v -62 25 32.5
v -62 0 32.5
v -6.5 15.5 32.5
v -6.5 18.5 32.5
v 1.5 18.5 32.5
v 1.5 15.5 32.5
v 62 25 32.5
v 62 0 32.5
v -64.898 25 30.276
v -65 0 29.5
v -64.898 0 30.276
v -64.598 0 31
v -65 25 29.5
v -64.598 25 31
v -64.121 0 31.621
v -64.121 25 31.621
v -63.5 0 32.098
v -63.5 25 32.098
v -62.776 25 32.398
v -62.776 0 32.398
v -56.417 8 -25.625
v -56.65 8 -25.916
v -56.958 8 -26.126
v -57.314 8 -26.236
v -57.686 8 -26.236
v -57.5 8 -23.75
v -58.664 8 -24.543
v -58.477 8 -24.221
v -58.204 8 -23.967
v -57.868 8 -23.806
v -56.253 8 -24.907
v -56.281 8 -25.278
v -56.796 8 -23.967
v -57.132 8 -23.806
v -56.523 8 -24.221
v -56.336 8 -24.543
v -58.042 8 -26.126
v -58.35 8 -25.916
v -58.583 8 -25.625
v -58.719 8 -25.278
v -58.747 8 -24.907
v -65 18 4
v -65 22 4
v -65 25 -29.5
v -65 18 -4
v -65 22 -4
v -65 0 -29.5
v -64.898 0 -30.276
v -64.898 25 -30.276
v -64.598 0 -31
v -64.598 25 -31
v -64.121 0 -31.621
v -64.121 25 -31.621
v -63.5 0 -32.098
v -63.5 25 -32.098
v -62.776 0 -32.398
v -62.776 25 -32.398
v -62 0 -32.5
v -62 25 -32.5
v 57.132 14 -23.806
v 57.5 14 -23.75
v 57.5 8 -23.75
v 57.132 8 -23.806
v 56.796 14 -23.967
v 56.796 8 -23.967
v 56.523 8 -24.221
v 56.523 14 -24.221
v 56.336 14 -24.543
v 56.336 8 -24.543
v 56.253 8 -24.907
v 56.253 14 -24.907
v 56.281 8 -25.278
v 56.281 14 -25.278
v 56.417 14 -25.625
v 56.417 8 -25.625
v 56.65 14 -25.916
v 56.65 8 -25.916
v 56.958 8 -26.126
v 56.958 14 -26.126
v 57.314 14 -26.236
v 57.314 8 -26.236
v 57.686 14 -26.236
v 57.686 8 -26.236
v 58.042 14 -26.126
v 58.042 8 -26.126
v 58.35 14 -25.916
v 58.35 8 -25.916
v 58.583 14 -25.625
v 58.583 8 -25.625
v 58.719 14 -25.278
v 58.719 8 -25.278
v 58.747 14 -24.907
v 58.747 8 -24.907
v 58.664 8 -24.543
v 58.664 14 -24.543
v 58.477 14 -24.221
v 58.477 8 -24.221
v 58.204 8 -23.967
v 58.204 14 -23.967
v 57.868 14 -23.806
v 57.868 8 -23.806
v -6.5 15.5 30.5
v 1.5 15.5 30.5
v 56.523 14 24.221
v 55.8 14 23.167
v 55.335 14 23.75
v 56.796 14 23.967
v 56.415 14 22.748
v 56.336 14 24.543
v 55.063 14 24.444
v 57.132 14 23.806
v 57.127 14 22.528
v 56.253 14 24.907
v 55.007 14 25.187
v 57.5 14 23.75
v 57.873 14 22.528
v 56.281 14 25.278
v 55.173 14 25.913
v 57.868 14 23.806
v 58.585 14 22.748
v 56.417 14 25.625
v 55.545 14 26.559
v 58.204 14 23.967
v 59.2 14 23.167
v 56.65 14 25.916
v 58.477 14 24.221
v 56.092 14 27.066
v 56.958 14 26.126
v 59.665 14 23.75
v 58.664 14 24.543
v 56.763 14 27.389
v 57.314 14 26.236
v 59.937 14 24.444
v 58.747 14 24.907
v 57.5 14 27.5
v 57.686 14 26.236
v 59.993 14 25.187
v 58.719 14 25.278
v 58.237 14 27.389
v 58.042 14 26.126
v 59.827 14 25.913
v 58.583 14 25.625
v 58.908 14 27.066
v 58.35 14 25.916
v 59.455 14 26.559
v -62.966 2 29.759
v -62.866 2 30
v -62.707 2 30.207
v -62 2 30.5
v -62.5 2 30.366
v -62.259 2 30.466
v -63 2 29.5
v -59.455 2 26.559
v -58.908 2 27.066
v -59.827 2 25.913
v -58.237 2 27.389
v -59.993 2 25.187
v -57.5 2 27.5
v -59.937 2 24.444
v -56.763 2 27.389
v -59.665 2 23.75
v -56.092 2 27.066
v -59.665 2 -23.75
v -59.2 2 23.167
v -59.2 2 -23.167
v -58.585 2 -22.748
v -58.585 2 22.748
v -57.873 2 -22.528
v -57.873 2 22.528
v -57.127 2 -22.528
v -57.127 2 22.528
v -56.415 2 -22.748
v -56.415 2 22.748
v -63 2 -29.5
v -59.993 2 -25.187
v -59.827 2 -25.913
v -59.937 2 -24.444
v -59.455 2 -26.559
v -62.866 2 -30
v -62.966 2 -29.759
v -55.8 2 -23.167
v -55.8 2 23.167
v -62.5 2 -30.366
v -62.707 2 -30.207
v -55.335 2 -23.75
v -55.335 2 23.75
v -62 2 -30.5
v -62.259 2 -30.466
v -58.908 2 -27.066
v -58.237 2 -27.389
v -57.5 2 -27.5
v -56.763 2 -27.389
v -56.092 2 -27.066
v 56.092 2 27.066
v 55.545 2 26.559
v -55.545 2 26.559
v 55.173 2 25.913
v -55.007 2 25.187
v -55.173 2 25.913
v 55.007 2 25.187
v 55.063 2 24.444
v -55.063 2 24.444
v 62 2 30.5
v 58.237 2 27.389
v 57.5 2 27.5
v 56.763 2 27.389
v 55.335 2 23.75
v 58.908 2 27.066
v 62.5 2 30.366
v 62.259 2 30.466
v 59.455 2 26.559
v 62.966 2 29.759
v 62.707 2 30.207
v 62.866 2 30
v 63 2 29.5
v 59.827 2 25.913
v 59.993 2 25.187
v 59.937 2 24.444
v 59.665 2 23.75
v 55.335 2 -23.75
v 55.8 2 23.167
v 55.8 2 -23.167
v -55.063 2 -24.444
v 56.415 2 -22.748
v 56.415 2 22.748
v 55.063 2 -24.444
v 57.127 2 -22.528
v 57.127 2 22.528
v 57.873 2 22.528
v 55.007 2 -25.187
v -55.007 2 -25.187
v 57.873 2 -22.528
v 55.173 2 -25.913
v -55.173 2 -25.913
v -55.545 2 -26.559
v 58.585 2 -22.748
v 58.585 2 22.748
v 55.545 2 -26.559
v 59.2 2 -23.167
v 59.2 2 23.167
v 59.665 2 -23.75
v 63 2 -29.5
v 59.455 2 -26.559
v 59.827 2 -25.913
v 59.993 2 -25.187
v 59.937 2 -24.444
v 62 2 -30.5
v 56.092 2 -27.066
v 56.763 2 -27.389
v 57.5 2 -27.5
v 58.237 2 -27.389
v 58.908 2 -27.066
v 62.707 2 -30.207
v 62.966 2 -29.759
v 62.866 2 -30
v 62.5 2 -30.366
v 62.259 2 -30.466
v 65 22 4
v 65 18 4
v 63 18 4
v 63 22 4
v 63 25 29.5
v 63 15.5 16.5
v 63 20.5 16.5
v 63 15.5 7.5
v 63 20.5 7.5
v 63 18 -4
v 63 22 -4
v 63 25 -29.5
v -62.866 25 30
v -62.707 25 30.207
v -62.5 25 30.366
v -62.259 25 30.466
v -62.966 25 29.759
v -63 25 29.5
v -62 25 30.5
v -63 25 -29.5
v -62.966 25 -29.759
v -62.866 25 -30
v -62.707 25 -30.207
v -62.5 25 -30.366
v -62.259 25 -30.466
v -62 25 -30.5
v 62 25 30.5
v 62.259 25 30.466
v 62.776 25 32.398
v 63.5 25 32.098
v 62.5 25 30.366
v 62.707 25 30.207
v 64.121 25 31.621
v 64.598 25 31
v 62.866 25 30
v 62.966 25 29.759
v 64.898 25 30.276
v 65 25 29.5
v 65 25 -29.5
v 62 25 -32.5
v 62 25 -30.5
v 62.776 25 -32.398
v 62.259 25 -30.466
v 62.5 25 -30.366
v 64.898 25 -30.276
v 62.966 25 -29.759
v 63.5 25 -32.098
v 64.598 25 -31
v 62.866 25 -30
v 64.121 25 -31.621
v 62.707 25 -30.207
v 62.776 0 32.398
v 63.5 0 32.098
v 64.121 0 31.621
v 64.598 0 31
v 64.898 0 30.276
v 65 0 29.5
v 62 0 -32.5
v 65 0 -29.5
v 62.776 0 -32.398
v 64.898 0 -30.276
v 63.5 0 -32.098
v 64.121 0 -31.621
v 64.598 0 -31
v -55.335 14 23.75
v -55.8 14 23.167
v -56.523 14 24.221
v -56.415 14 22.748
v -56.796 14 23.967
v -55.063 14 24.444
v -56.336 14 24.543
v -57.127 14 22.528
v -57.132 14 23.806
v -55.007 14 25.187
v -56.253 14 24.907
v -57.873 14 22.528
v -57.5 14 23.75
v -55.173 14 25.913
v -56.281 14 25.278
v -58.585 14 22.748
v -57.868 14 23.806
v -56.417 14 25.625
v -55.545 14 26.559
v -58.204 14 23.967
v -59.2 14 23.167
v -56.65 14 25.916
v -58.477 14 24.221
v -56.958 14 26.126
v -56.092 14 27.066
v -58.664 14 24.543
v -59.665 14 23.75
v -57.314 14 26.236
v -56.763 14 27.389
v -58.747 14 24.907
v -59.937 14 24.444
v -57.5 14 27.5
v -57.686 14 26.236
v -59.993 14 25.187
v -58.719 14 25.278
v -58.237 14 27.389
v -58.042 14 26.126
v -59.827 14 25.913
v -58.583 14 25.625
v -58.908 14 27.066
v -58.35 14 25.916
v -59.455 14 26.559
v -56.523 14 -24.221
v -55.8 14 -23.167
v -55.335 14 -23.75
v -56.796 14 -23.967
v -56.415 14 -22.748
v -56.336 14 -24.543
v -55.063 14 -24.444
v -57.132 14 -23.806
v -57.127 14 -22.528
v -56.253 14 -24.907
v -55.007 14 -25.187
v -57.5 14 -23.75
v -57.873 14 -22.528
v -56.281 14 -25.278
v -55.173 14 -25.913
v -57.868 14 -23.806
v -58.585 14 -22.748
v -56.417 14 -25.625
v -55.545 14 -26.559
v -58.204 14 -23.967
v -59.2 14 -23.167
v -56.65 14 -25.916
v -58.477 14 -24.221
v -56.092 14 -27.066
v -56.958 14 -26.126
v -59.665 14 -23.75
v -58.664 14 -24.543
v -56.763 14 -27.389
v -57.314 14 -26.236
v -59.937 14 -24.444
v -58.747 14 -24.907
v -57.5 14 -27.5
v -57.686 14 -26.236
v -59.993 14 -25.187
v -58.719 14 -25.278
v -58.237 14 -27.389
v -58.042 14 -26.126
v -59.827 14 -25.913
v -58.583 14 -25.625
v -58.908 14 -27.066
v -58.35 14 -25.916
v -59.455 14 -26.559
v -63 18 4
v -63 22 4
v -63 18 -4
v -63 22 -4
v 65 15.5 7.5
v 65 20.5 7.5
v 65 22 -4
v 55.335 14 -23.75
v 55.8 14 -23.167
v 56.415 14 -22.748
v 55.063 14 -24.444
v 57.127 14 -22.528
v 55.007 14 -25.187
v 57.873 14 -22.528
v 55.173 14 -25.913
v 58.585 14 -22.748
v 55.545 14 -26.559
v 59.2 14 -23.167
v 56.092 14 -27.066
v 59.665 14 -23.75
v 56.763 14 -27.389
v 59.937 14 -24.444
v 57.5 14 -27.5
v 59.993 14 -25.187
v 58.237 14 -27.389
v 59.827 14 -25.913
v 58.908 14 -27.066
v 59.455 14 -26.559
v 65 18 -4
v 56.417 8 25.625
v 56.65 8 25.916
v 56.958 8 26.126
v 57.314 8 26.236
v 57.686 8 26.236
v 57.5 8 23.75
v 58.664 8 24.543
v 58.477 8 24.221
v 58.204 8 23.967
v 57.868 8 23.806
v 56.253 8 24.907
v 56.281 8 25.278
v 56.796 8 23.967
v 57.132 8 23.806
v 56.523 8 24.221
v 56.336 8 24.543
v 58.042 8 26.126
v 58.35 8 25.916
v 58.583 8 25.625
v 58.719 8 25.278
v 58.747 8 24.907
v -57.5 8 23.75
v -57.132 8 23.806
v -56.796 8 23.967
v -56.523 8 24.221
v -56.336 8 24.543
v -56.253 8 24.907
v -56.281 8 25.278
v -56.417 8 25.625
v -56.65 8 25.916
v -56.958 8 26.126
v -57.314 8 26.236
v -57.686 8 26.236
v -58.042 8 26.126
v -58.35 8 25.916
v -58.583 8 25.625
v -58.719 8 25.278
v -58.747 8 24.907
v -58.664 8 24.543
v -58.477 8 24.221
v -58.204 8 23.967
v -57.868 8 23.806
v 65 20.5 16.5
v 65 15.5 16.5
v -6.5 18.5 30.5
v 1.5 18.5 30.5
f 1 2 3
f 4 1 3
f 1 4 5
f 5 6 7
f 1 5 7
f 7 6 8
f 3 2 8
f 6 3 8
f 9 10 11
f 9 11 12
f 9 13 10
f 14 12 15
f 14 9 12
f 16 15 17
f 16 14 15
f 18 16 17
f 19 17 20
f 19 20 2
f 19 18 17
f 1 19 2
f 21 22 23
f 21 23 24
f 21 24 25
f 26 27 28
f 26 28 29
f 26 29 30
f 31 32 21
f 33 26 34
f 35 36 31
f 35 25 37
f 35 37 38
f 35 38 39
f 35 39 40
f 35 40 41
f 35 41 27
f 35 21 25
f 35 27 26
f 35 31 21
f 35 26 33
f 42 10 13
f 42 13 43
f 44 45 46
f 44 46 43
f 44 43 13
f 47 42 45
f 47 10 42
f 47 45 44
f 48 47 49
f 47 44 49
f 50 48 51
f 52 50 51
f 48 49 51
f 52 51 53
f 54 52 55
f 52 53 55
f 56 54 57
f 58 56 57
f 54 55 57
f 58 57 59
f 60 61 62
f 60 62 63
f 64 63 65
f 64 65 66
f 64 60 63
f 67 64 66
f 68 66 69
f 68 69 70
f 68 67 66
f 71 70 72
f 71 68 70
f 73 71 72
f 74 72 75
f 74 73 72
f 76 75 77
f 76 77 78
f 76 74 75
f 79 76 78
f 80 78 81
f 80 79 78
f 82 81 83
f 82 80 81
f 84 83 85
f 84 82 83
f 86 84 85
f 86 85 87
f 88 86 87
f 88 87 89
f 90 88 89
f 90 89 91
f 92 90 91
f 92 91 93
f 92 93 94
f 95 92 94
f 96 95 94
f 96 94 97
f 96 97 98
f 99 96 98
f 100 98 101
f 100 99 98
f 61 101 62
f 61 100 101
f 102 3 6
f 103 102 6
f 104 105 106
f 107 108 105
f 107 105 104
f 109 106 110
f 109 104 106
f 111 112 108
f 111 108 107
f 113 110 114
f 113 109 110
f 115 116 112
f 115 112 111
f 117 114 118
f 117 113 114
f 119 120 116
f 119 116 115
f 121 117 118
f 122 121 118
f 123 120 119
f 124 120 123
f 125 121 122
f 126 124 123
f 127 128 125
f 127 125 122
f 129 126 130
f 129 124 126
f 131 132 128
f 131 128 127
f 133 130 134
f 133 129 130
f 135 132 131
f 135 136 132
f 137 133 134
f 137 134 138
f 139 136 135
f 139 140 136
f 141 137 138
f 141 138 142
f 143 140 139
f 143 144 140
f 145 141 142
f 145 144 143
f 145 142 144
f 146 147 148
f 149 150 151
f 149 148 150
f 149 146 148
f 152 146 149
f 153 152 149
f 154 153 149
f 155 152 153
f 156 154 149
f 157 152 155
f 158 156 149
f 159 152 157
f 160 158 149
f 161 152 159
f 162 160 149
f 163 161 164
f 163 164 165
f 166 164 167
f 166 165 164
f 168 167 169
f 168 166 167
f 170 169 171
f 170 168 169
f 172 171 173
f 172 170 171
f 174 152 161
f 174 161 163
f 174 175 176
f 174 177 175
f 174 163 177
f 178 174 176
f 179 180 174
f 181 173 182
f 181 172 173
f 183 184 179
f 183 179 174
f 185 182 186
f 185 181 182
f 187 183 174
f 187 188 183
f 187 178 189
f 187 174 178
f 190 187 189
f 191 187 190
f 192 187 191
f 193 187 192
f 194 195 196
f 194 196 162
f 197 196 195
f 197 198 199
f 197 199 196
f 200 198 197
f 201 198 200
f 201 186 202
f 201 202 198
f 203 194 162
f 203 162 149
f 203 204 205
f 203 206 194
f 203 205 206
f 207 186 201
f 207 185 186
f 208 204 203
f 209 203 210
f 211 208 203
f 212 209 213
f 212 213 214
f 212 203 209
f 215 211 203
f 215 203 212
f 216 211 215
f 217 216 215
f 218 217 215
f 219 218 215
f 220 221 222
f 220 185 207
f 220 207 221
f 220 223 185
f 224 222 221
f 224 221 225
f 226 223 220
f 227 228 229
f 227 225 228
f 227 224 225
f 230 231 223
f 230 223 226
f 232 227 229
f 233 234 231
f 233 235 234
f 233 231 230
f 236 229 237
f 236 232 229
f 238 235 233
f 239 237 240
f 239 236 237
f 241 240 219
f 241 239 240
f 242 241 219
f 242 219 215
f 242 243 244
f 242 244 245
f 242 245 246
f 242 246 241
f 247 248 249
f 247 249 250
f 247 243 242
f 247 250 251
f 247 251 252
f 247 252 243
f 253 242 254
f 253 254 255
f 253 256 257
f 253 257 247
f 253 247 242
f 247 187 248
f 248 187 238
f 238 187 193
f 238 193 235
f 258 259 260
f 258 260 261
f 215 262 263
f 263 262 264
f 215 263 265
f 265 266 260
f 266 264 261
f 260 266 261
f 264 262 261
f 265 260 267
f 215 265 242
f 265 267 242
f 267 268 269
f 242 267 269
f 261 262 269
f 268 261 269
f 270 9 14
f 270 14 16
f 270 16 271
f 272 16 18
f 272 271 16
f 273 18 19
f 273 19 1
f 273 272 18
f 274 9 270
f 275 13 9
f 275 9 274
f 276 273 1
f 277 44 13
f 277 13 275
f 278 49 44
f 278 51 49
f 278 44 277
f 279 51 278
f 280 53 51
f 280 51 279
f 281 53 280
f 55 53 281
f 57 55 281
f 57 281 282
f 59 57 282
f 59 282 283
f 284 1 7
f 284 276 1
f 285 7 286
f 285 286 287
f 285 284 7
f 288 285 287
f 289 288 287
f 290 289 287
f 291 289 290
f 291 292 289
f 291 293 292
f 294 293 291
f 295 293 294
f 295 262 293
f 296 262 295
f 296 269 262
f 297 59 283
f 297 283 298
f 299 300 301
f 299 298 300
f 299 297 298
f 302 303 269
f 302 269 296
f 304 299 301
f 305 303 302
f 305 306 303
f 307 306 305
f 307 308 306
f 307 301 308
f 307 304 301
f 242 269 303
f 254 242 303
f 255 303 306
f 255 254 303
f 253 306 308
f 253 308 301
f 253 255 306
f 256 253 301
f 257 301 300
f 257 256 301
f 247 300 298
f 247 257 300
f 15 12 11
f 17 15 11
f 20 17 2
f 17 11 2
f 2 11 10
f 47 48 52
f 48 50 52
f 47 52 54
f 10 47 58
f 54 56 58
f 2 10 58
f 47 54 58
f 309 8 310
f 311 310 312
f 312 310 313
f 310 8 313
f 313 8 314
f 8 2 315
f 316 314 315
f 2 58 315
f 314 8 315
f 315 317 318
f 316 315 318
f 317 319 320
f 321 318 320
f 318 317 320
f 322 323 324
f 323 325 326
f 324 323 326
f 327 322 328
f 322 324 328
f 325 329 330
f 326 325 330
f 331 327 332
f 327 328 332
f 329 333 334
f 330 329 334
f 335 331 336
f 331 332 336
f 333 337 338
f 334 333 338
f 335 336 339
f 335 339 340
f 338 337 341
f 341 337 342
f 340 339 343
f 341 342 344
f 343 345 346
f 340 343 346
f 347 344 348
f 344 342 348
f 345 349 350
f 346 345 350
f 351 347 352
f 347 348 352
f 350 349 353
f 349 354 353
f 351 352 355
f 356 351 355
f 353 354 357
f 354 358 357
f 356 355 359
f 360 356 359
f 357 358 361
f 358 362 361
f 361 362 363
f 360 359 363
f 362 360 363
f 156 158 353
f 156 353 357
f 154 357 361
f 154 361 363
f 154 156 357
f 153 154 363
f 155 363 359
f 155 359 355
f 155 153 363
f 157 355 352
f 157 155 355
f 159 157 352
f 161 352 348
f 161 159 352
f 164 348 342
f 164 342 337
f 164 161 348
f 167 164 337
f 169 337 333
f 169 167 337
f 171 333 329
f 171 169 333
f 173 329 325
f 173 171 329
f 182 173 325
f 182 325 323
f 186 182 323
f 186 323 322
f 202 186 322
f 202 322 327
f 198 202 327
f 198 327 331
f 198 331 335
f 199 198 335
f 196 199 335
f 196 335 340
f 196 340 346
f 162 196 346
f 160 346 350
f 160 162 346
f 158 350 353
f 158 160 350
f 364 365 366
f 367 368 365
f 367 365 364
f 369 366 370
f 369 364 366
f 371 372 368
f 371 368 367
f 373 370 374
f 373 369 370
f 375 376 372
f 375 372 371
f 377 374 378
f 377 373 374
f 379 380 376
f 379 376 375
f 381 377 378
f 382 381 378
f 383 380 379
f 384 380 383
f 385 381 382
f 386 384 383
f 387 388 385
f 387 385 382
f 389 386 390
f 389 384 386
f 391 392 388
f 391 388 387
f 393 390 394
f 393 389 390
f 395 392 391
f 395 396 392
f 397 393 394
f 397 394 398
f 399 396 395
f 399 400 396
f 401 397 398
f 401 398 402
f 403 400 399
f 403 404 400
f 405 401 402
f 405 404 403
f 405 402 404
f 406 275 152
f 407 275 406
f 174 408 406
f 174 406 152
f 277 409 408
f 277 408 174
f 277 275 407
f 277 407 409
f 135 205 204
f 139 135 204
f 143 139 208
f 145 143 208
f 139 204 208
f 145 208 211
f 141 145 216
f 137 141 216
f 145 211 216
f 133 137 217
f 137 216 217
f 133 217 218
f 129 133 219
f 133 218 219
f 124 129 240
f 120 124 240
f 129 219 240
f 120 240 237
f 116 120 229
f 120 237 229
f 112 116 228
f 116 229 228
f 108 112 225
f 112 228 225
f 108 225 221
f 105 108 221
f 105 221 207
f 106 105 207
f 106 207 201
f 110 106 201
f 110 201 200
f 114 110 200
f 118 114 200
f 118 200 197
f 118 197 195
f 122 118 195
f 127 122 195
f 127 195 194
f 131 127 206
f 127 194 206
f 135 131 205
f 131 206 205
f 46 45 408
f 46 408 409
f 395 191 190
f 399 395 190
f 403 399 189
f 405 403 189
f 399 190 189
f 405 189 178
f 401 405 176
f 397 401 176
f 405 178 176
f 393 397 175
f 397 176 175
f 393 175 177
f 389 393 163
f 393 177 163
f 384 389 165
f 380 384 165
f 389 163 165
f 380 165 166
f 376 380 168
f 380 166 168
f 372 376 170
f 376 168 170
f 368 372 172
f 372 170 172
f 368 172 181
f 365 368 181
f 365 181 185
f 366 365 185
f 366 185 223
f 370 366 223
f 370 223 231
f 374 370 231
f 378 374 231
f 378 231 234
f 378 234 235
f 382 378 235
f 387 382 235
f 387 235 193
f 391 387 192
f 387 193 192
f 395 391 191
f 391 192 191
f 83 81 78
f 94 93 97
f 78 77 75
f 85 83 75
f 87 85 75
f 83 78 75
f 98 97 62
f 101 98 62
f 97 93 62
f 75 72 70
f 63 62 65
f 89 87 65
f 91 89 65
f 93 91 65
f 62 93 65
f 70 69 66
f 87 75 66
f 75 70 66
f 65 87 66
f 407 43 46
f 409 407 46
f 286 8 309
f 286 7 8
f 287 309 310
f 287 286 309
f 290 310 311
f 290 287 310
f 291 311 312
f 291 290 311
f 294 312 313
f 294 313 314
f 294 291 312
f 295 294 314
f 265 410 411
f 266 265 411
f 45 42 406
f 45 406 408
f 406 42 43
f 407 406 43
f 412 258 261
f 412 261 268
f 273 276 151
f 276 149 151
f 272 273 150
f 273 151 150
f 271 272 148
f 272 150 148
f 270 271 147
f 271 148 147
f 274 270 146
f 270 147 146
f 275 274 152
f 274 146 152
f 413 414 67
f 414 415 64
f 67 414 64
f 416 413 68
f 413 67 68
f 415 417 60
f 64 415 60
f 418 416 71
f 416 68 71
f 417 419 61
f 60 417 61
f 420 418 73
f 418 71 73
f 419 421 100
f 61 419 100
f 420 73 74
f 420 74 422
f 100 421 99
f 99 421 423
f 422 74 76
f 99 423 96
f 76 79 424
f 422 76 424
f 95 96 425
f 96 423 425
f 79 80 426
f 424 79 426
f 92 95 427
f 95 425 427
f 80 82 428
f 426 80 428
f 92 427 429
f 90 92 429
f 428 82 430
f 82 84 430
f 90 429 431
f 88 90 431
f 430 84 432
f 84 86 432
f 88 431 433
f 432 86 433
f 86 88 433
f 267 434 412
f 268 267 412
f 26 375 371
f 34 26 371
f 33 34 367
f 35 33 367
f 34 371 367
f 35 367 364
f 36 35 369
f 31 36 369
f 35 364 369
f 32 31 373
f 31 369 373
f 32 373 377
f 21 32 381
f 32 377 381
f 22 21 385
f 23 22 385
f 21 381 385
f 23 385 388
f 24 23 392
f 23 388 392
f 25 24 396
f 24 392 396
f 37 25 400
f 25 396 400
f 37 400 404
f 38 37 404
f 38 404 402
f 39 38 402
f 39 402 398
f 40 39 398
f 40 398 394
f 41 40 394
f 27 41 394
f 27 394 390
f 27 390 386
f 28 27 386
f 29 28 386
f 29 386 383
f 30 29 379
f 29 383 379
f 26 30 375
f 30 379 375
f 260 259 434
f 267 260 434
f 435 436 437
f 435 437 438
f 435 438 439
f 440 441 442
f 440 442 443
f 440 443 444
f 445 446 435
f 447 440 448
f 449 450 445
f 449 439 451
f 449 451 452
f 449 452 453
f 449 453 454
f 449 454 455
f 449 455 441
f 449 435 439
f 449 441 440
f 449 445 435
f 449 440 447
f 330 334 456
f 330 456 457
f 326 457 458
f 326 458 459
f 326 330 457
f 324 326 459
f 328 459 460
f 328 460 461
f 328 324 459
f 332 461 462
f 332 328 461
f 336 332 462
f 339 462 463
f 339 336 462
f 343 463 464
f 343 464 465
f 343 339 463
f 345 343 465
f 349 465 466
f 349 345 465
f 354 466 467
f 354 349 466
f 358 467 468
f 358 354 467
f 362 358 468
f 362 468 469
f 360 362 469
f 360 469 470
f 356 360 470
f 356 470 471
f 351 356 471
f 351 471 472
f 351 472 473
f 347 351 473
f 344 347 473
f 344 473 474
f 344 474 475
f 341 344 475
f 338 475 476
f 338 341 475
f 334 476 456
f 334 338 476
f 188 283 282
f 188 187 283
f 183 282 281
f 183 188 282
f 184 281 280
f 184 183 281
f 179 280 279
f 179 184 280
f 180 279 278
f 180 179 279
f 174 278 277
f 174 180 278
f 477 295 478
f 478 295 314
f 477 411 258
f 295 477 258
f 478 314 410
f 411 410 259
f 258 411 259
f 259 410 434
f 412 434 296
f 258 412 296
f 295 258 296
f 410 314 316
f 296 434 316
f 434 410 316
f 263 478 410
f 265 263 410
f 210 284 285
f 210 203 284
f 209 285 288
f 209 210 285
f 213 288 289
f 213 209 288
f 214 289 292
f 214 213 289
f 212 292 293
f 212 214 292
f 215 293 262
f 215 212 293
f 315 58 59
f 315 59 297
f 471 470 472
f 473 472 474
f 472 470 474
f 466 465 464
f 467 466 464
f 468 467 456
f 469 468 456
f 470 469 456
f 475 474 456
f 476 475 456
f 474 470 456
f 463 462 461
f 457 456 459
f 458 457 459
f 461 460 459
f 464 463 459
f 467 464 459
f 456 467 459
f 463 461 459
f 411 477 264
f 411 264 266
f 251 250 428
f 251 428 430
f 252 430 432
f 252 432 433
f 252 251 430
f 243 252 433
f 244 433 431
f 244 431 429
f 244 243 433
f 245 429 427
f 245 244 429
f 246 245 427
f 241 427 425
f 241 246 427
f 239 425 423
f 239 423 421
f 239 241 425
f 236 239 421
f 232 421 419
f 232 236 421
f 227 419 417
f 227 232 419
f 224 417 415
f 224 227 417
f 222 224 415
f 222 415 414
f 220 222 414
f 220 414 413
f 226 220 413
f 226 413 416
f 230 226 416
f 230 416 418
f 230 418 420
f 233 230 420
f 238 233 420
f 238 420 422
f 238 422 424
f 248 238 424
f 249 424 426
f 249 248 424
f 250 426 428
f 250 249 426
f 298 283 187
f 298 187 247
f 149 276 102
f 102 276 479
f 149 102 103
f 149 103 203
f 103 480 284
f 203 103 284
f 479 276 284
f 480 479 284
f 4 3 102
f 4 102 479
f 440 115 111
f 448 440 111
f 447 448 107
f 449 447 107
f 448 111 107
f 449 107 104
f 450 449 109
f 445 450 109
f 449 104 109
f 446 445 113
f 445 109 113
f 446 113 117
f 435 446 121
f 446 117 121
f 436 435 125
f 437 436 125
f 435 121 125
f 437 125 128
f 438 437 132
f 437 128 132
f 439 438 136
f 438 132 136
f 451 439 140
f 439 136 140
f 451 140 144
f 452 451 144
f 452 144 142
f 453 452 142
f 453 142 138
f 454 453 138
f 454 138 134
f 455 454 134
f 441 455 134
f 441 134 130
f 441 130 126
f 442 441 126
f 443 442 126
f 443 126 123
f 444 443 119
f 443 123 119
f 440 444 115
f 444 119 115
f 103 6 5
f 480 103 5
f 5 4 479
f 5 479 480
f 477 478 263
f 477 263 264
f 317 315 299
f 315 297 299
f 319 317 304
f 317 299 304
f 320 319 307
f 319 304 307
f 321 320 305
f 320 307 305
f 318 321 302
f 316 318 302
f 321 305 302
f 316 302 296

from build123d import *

# Parameters (mm, degrees)
SKETCH_1_W               = 130
SKETCH_1_H               = 65
EXTRUDE_1_DEPTH          = 25
SKETCH_2_W               = 126
SKETCH_2_H               = 61
CUT_EXTRUDE_1_DEPTH      = 23
SKETCH_3_R               = 2.5
EXTRUDE_2_DEPTH          = 12
SKETCH_5_W               = 8
SKETCH_5_H               = 4
CUT_EXTRUDE_3_DEPTH      = 2
SKETCH_6_W               = 8
SKETCH_6_H               = 3
CUT_EXTRUDE_4_DEPTH      = 2
SKETCH_7_W               = 9
SKETCH_7_H               = 5
CUT_EXTRUDE_5_DEPTH      = 2
SKETCH_8_R               = 1.25
CUT_EXTRUDE_6_DEPTH      = 6
MIRROR_7_COPY_1_SKETCH_R = 2.5
MIRROR_7_COPY_1_DEPTH    = 12
MIRROR_7_COPY_2_SKETCH_R = 1.25
MIRROR_7_COPY_2_DEPTH    = 6
FILLET_1_R               = 1
FILLET_2_R               = 3


with BuildPart() as part:
    # Эскиз1 → Бобышка-Вытянуть1 (new body)
    with BuildSketch(Plane(origin=(0, 0, 0), x_dir=(1, 0, 0), z_dir=(0, 1, 0))):
        Rectangle(SKETCH_1_W, SKETCH_1_H)
    extrude(amount=EXTRUDE_1_DEPTH)

    # Эскиз2 → Вырез-Вытянуть1 (cut)
    with BuildSketch(Plane(origin=(0, 25, 0), x_dir=(1, 0, 0), z_dir=(0, 1, 0))):
        Rectangle(SKETCH_2_W, SKETCH_2_H)
    extrude(amount=-CUT_EXTRUDE_1_DEPTH, mode=Mode.SUBTRACT)

    # Эскиз3 → Бобышка-Вытянуть2 (add)
    with BuildSketch(Plane(origin=(0, 2, 0), x_dir=(1, 0, 0), z_dir=(0, 1, 0))):
        with Locations(Location((-57.5, 25, 0), (0, 0, 90))):
            Circle(SKETCH_3_R)
    extrude_2 = extrude(amount=EXTRUDE_2_DEPTH)

    # Эскиз5 → Вырез-Вытянуть3 (cut)
    with BuildSketch(Plane(origin=(65, 0, 0), x_dir=(0, 0, -1), z_dir=(1, 0, 0))):
        with Locations((0, 20)):
            Rectangle(SKETCH_5_W, SKETCH_5_H)
    cut_extrude_3 = extrude(amount=-CUT_EXTRUDE_3_DEPTH, mode=Mode.SUBTRACT)

    # Зеркальное отражение5: Вырез-Вытянуть3 across plane
    add(cut_extrude_3.mirror(Plane(origin=(0, 0, 0), x_dir=(0, 0, 1), z_dir=(1, 0, 0))), mode=Mode.SUBTRACT)

    # Эскиз6 → Вырез-Вытянуть4 (cut)
    with BuildSketch(Plane.XY.offset(32.5)):
        with Locations((-2.5, 17)):
            Rectangle(SKETCH_6_W, SKETCH_6_H)
    extrude(amount=-CUT_EXTRUDE_4_DEPTH, mode=Mode.SUBTRACT)

    # Эскиз7 → Вырез-Вытянуть5 (cut)
    with BuildSketch(Plane(origin=(65, 0, 0), x_dir=(0, 0, -1), z_dir=(1, 0, 0))):
        with Locations((-12, 18)):
            Rectangle(SKETCH_7_W, SKETCH_7_H)
    extrude(amount=-CUT_EXTRUDE_5_DEPTH, mode=Mode.SUBTRACT)

    # Эскиз8 → Вырез-Вытянуть6 (cut)
    with BuildSketch(Plane(origin=(0, 14, 0), x_dir=(1, 0, 0), z_dir=(0, 1, 0))):
        with Locations(Location((-57.5, 25, 0), (0, 0, 270))):
            Circle(SKETCH_8_R)
    cut_extrude_6 = extrude(amount=-CUT_EXTRUDE_6_DEPTH, mode=Mode.SUBTRACT)

    # Зеркальное отражение6: Бобышка-Вытянуть2, Вырез-Вытянуть6 across plane
    add(extrude_2.mirror(Plane(origin=(0, 0, 0), x_dir=(0, 0, 1), z_dir=(1, 0, 0))))
    add(cut_extrude_6.mirror(Plane(origin=(0, 0, 0), x_dir=(0, 0, 1), z_dir=(1, 0, 0))), mode=Mode.SUBTRACT)

    # Зеркальное отражение7: Бобышка-Вытянуть2, Вырез-Вытянуть6 across plane
    add(extrude_2.mirror(Plane.XY))
    add(cut_extrude_6.mirror(Plane.XY), mode=Mode.SUBTRACT)

    # Зеркальное отражение7 copy 1 sketch → Зеркальное отражение7 copy 1 (add)
    with BuildSketch(Plane(origin=(0, 2, 0), x_dir=(-1, 0, 0), z_dir=(0, 1, 0))):
        with Locations(Location((-57.5, 25, 0), (0, 0, 90))):
            Circle(MIRROR_7_COPY_1_SKETCH_R)
    extrude(amount=MIRROR_7_COPY_1_DEPTH)

    # Зеркальное отражение7 copy 2 sketch → Зеркальное отражение7 copy 2 (cut)
    with BuildSketch(Plane(origin=(0, 14, 0), x_dir=(-1, 0, 0), z_dir=(0, 1, 0))):
        with Locations(Location((-57.5, 25, 0), (0, 0, 270))):
            Circle(MIRROR_7_COPY_2_SKETCH_R)
    extrude(amount=-MIRROR_7_COPY_2_DEPTH, mode=Mode.SUBTRACT)

    # Скругление1
    fillet_1_edges = [part.edges().sort_by_distance(p)[0] for p in [
        (63, 13.5, -30.5),
        (63, 13.5, 30.5),
        (-63, 13.5, 30.5),
        (-63, 13.5, -30.5),
    ]]
    fillet(fillet_1_edges, radius=FILLET_1_R)

    # Скругление2
    fillet_2_edges = [part.edges().sort_by_distance(p)[0] for p in [
        (65, 12.5, 32.5),
        (-65, 12.5, 32.5),
        (-65, 12.5, -32.5),
        (65, 12.5, -32.5),
    ]]
    fillet(fillet_2_edges, radius=FILLET_2_R)


solid = part.part
